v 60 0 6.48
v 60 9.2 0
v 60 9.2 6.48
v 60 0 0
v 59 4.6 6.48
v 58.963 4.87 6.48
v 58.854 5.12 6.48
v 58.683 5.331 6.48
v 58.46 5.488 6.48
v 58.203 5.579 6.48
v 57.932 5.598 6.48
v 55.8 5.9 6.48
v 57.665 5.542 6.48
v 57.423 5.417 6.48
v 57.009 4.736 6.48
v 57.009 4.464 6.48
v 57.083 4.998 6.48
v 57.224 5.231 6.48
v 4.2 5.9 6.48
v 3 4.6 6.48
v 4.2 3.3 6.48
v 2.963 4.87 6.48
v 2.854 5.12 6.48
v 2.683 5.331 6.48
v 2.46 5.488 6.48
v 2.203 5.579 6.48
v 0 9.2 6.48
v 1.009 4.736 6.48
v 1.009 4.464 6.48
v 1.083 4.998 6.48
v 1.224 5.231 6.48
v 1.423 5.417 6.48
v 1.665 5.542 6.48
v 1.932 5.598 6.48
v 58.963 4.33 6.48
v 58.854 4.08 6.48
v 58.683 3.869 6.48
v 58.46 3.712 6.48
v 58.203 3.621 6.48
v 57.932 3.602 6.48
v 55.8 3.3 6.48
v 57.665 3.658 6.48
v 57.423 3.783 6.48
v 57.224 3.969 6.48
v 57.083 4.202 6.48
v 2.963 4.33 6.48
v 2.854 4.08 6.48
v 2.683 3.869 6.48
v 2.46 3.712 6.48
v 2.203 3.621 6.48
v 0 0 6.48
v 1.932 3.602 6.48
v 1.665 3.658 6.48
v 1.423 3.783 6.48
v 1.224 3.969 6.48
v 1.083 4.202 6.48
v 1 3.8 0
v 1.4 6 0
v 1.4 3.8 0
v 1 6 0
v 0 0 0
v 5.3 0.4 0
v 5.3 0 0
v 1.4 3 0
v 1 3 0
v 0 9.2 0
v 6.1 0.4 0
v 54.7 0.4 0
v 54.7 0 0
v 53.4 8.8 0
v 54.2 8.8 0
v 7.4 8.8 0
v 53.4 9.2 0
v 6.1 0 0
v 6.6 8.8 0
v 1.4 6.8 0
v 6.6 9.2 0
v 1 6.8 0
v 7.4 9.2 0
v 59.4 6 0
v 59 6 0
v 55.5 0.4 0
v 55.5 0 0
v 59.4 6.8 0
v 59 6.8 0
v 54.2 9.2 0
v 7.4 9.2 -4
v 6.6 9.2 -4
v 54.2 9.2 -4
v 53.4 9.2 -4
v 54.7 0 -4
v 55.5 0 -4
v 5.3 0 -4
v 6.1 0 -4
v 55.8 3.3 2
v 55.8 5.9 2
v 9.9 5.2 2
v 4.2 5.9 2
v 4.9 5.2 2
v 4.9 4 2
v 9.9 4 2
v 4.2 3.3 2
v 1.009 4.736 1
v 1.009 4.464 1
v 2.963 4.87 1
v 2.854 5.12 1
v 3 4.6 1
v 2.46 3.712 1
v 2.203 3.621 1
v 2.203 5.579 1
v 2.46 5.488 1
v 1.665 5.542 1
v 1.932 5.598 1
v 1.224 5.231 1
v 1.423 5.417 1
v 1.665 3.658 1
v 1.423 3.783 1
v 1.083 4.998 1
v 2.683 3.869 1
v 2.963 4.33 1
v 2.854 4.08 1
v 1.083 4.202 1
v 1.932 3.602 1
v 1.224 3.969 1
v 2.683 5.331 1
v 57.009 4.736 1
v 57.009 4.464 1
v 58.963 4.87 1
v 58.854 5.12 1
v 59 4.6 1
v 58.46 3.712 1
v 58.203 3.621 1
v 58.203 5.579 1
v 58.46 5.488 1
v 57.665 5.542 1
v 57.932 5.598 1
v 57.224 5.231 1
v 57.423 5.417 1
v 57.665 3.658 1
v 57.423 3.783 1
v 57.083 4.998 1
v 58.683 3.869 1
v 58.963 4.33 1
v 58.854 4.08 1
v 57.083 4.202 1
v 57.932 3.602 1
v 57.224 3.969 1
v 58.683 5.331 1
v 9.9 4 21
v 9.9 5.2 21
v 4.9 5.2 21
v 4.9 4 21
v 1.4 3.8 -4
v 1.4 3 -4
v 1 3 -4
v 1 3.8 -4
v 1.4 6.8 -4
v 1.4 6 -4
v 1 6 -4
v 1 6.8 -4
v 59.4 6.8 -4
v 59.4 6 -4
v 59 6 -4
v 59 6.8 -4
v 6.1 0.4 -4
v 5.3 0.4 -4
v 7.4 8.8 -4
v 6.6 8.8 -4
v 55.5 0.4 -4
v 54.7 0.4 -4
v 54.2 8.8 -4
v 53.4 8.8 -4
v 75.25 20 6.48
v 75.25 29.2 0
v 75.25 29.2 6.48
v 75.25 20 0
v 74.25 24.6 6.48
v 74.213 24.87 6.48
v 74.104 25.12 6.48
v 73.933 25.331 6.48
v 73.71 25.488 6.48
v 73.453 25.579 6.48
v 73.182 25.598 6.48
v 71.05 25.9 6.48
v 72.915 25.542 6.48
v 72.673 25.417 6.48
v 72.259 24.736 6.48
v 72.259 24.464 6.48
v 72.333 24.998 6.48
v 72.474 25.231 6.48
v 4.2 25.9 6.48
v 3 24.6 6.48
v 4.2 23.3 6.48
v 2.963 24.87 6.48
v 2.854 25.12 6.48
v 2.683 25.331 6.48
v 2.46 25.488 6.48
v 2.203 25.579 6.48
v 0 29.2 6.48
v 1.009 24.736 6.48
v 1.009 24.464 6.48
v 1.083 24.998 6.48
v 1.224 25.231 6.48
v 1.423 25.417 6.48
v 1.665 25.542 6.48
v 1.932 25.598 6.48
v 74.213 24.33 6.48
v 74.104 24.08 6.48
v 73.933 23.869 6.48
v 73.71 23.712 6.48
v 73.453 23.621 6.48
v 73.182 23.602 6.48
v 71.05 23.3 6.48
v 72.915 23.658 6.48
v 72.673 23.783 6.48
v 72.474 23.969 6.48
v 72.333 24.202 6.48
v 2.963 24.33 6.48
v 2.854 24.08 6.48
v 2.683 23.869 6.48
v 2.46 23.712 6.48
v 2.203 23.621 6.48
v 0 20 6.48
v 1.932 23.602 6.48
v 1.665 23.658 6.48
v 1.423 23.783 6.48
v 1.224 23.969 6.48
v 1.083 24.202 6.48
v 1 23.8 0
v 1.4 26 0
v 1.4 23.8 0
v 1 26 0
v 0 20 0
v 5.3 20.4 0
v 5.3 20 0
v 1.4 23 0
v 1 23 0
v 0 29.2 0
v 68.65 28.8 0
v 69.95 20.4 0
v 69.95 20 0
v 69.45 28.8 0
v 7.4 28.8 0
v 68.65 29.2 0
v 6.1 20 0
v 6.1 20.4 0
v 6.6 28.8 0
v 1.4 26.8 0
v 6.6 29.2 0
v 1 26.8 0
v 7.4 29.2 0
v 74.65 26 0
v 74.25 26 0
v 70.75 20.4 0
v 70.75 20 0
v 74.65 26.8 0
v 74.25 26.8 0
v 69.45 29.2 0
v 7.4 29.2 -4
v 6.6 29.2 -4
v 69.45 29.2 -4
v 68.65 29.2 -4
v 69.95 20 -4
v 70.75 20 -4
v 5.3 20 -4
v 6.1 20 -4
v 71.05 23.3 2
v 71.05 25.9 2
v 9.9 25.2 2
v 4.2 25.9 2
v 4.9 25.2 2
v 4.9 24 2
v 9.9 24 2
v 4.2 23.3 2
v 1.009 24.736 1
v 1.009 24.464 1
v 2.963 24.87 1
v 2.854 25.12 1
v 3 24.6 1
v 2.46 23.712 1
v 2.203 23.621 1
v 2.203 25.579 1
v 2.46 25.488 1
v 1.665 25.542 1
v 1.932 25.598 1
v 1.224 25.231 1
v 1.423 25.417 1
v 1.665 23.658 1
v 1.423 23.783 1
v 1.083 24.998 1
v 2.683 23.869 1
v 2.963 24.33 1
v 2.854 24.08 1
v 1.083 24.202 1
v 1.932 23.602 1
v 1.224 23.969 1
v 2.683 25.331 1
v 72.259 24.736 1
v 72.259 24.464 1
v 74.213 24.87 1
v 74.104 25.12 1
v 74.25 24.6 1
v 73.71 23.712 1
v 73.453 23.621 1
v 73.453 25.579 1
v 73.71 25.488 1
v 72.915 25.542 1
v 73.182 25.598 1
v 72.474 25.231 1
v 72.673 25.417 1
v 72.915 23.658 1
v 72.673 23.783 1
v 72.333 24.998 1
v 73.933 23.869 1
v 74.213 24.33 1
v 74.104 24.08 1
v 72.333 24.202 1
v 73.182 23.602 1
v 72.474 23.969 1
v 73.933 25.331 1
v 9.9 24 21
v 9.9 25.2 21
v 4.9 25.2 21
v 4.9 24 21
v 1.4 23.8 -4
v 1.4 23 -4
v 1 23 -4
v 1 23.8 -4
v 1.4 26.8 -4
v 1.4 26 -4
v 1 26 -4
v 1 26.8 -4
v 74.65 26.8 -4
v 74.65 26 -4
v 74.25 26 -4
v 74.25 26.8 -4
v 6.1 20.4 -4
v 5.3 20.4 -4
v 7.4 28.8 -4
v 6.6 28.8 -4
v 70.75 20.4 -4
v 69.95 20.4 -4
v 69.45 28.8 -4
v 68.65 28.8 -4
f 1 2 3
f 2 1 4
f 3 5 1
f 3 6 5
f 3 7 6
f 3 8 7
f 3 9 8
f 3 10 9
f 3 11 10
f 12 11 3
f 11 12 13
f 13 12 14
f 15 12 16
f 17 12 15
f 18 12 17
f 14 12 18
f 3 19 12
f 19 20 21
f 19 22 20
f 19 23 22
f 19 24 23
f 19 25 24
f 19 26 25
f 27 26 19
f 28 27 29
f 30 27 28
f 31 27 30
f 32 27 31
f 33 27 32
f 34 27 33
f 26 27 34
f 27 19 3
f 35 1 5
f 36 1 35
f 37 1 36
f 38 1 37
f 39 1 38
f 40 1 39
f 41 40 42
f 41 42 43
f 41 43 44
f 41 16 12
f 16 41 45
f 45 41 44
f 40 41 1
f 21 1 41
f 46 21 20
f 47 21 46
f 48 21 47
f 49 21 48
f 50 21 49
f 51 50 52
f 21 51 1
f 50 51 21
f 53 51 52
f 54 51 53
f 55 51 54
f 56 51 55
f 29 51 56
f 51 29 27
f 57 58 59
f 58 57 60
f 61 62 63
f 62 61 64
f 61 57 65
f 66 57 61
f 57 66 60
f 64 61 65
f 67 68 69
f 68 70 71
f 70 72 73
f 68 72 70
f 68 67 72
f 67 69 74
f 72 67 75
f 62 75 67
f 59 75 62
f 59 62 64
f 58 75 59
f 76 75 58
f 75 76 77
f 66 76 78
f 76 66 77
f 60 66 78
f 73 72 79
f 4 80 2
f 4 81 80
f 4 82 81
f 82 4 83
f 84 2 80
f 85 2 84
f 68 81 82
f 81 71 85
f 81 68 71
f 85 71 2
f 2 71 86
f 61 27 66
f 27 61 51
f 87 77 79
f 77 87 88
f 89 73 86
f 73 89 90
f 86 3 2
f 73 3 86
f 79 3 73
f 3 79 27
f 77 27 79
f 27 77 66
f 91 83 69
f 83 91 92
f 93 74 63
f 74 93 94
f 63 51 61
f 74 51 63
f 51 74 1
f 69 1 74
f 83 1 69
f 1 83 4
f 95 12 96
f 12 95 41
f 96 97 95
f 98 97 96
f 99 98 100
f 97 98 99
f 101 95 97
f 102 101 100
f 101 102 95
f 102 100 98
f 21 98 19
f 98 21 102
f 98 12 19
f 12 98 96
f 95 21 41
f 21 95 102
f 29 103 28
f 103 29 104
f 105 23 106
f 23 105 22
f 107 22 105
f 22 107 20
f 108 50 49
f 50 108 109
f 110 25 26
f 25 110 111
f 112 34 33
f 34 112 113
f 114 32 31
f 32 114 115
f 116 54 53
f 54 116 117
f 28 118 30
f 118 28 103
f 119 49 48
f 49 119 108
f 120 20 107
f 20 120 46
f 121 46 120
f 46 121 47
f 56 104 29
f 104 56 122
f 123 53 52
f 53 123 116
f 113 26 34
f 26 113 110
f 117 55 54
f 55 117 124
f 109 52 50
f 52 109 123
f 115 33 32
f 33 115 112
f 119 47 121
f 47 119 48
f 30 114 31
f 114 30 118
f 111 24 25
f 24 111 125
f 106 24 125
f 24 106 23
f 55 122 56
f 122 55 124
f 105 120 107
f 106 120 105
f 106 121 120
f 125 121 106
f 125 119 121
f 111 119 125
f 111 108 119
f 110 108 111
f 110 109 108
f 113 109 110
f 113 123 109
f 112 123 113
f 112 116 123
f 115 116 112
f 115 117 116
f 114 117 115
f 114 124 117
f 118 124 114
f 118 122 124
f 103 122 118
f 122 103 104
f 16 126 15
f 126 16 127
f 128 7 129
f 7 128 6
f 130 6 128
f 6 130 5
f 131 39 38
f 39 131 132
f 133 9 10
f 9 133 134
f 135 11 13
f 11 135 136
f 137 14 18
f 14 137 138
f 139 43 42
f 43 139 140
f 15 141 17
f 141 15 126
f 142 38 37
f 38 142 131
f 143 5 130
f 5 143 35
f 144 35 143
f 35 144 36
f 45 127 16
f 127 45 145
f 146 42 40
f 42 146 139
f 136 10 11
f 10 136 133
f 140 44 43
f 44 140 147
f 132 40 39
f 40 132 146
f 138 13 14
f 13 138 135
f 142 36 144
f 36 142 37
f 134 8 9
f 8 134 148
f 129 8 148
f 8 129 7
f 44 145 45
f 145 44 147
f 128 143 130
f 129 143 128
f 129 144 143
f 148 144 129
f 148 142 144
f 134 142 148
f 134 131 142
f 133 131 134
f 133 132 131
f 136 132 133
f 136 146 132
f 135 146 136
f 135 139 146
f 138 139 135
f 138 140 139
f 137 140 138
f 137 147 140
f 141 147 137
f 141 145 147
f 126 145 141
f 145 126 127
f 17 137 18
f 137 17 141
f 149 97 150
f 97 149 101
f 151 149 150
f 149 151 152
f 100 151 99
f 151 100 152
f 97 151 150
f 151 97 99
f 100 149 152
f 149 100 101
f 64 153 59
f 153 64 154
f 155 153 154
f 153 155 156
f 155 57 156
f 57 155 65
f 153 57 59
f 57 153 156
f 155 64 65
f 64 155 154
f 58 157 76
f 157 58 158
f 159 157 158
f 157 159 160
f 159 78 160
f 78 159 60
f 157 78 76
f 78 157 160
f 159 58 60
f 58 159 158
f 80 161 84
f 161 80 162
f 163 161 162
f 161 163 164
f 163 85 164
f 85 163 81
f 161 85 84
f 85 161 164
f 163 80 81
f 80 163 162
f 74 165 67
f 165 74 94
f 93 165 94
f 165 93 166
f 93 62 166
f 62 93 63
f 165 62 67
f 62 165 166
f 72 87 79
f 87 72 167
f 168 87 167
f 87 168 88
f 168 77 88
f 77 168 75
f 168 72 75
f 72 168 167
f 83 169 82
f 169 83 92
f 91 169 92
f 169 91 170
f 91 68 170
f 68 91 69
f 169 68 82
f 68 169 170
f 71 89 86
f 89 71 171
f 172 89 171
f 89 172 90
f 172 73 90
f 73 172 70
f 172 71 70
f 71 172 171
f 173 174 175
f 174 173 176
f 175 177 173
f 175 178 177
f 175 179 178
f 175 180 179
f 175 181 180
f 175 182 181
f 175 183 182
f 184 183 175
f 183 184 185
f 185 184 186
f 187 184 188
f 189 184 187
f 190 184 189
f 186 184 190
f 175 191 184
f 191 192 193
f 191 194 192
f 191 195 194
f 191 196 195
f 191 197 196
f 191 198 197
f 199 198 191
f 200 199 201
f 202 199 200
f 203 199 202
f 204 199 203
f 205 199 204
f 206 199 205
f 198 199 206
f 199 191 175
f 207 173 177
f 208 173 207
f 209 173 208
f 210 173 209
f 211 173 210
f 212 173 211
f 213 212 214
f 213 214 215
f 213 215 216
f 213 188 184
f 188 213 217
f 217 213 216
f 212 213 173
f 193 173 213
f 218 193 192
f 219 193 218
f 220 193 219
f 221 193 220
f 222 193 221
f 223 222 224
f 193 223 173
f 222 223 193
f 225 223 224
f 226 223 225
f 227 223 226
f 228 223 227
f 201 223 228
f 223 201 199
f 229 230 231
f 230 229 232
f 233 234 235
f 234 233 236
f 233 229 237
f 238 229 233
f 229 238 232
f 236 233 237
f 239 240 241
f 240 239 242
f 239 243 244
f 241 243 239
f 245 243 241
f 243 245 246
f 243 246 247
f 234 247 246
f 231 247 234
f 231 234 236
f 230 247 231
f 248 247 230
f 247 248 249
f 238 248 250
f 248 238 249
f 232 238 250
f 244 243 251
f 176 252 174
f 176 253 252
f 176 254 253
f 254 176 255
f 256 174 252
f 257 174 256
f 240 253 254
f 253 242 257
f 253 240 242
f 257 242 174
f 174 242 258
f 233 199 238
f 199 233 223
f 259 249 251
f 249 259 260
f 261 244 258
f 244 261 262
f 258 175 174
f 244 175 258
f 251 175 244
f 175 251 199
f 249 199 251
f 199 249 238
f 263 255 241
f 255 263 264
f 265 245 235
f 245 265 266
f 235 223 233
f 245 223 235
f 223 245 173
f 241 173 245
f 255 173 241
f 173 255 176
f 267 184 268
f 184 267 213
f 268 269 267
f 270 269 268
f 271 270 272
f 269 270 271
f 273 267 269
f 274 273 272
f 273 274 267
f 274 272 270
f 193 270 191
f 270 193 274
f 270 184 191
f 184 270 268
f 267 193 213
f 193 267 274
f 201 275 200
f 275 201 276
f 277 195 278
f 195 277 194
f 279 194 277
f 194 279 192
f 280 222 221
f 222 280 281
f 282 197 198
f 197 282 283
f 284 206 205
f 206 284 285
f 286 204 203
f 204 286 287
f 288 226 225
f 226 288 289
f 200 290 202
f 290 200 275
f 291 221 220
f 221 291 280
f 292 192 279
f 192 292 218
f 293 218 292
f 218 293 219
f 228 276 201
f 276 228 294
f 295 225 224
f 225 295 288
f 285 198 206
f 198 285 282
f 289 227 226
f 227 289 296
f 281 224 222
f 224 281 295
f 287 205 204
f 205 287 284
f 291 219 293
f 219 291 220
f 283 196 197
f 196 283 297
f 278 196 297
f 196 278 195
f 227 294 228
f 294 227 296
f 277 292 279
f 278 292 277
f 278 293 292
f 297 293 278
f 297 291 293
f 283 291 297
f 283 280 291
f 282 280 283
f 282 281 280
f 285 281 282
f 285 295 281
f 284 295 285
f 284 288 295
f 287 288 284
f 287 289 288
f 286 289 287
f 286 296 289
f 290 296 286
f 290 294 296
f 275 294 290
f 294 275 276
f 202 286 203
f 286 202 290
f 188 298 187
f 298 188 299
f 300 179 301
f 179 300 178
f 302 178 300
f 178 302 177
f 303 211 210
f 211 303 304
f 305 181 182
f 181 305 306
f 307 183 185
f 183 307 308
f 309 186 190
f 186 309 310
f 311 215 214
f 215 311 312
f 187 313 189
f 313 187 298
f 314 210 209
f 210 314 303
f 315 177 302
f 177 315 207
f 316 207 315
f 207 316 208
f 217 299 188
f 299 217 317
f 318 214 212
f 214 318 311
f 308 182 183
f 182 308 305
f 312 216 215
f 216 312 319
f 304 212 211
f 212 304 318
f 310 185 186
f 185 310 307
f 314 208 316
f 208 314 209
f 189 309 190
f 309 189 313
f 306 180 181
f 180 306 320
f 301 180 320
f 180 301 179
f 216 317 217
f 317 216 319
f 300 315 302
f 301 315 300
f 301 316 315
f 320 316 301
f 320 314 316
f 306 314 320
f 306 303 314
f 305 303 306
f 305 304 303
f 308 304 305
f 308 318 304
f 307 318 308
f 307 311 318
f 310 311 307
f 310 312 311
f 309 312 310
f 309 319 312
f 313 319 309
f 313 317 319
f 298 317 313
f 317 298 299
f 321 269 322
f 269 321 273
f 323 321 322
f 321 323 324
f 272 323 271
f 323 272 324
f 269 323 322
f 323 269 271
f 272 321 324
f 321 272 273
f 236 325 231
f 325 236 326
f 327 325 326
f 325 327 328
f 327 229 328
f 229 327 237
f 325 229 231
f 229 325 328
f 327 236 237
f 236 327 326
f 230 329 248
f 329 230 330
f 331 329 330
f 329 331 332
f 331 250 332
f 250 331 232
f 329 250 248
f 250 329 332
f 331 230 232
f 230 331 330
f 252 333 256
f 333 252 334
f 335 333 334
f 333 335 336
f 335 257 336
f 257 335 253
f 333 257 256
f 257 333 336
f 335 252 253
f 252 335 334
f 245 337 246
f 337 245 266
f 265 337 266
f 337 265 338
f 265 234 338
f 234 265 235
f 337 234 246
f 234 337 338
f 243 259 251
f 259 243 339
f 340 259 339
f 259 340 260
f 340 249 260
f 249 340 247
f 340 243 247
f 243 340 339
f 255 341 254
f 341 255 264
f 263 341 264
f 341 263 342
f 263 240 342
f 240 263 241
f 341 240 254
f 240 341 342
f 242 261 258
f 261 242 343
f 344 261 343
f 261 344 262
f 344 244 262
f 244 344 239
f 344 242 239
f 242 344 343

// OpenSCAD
// file: rounder.scad
// rounder.scad
// cutting tool for rounding off corners with a cylinder

//---------------------
module rounder(
r=10,   // radius
h=10,   // height
f=22,    // $fn
extra=0.01  // extra size for the cube
){

difference(){
  translate([-extra,-extra,-extra])
  cube([r+extra,r+extra,h+2*extra]);
  translate([r,r,-1])
  cylinder(r=r,h=h+2,$fn=f);
}

}

//========================

rounder();

//========================
// main file
//=================================================================================
// slidePot.scad
//
// Slide style potentiometers.
//
// Dr Tom Flint, 3 Nov 2021
//=================================================================================


use <../Parts/rounder.scad>

//---------------------------------------------------------------------
module slidePot1(tol=0,pos=0){

x0 = 60.0;
y0 = 9.2;
z0 = 6.48;
  difference(){
    // main body
    cube([x0,y0,z0]);
    
    // slot
    translate([4.2,(y0-2.6)/2,2])
    cube([x0-2*4.2,2.6,z0]);

    // screw holes
    translate([2.0,y0/2,1])
    cylinder(r=1,h=8,$fn=23);
    translate([x0-2.0,y0/2,1])
    cylinder(r=1,h=8,$fn=23);
  }
  
  // slider - simplified shape
  translate([2.4+2.5+(x0-2*4.2-6)*pos,(y0-1.2)/2, 1])
  cube([5.0,1.2,20]);
  
  // terminals are on 0.1" grid = 2.54 mm
  // 3 pins on the case:
  translate([1,3.0,-4])
  cube([0.4,0.8,5]);
  translate([1,6.0,-4])
  cube([0.4,0.8,5]);
  translate([x0-1,6.0,-4])
  cube([0.4,0.8,5]);
  // 2 pins on each end
  translate([5.3,0,-4])
  cube([0.8,0.4,5]);
  translate([6.6,y0-0.4,-4])
  cube([0.8,0.4,5]);

  translate([x0-5.3,0,-4])
  cube([0.8,0.4,5]);
  translate([x0-6.6,y0-0.4,-4])
  cube([0.8,0.4,5]);
  
}

//---------------------------------------------------------------------
module slidePot2(tol=0,pos=0){

x0 = 75.25;
y0 = 9.2;
z0 = 6.48;
  difference(){
    // main body
    cube([x0,y0,z0]);
    
    // slot
    translate([4.2,(y0-2.6)/2,2])
    cube([x0-2*4.2,2.6,z0]);

    // screw holes
    translate([2.0,y0/2,1])
    cylinder(r=1,h=8,$fn=23);
    translate([x0-2.0,y0/2,1])
    cylinder(r=1,h=8,$fn=23);
  }
  
  // slider - simplified shape
  translate([2.4+2.5+(x0-2*4.2-6)*pos,(y0-1.2)/2, 1])
  cube([5.0,1.2,20]);
  
  // terminals are on 0.1" grid = 2.54 mm
  // 3 pins on the case:
  translate([1,3.0,-4])
  cube([0.4,0.8,5]);
  translate([1,6.0,-4])
  cube([0.4,0.8,5]);
  translate([x0-1,6.0,-4])
  cube([0.4,0.8,5]);
  // 2 pins on each end
  translate([5.3,0,-4])
  cube([0.8,0.4,5]);
  translate([6.6,y0-0.4,-4])
  cube([0.8,0.4,5]);

  translate([x0-5.3,0,-4])
  cube([0.8,0.4,5]);
  translate([x0-6.6,y0-0.4,-4])
  cube([0.8,0.4,5]);
  
}


//=================================================================================

slidePot1(pos=0);
translate([0,20,0])
slidePot2(pos=0);

//=================================================================================
